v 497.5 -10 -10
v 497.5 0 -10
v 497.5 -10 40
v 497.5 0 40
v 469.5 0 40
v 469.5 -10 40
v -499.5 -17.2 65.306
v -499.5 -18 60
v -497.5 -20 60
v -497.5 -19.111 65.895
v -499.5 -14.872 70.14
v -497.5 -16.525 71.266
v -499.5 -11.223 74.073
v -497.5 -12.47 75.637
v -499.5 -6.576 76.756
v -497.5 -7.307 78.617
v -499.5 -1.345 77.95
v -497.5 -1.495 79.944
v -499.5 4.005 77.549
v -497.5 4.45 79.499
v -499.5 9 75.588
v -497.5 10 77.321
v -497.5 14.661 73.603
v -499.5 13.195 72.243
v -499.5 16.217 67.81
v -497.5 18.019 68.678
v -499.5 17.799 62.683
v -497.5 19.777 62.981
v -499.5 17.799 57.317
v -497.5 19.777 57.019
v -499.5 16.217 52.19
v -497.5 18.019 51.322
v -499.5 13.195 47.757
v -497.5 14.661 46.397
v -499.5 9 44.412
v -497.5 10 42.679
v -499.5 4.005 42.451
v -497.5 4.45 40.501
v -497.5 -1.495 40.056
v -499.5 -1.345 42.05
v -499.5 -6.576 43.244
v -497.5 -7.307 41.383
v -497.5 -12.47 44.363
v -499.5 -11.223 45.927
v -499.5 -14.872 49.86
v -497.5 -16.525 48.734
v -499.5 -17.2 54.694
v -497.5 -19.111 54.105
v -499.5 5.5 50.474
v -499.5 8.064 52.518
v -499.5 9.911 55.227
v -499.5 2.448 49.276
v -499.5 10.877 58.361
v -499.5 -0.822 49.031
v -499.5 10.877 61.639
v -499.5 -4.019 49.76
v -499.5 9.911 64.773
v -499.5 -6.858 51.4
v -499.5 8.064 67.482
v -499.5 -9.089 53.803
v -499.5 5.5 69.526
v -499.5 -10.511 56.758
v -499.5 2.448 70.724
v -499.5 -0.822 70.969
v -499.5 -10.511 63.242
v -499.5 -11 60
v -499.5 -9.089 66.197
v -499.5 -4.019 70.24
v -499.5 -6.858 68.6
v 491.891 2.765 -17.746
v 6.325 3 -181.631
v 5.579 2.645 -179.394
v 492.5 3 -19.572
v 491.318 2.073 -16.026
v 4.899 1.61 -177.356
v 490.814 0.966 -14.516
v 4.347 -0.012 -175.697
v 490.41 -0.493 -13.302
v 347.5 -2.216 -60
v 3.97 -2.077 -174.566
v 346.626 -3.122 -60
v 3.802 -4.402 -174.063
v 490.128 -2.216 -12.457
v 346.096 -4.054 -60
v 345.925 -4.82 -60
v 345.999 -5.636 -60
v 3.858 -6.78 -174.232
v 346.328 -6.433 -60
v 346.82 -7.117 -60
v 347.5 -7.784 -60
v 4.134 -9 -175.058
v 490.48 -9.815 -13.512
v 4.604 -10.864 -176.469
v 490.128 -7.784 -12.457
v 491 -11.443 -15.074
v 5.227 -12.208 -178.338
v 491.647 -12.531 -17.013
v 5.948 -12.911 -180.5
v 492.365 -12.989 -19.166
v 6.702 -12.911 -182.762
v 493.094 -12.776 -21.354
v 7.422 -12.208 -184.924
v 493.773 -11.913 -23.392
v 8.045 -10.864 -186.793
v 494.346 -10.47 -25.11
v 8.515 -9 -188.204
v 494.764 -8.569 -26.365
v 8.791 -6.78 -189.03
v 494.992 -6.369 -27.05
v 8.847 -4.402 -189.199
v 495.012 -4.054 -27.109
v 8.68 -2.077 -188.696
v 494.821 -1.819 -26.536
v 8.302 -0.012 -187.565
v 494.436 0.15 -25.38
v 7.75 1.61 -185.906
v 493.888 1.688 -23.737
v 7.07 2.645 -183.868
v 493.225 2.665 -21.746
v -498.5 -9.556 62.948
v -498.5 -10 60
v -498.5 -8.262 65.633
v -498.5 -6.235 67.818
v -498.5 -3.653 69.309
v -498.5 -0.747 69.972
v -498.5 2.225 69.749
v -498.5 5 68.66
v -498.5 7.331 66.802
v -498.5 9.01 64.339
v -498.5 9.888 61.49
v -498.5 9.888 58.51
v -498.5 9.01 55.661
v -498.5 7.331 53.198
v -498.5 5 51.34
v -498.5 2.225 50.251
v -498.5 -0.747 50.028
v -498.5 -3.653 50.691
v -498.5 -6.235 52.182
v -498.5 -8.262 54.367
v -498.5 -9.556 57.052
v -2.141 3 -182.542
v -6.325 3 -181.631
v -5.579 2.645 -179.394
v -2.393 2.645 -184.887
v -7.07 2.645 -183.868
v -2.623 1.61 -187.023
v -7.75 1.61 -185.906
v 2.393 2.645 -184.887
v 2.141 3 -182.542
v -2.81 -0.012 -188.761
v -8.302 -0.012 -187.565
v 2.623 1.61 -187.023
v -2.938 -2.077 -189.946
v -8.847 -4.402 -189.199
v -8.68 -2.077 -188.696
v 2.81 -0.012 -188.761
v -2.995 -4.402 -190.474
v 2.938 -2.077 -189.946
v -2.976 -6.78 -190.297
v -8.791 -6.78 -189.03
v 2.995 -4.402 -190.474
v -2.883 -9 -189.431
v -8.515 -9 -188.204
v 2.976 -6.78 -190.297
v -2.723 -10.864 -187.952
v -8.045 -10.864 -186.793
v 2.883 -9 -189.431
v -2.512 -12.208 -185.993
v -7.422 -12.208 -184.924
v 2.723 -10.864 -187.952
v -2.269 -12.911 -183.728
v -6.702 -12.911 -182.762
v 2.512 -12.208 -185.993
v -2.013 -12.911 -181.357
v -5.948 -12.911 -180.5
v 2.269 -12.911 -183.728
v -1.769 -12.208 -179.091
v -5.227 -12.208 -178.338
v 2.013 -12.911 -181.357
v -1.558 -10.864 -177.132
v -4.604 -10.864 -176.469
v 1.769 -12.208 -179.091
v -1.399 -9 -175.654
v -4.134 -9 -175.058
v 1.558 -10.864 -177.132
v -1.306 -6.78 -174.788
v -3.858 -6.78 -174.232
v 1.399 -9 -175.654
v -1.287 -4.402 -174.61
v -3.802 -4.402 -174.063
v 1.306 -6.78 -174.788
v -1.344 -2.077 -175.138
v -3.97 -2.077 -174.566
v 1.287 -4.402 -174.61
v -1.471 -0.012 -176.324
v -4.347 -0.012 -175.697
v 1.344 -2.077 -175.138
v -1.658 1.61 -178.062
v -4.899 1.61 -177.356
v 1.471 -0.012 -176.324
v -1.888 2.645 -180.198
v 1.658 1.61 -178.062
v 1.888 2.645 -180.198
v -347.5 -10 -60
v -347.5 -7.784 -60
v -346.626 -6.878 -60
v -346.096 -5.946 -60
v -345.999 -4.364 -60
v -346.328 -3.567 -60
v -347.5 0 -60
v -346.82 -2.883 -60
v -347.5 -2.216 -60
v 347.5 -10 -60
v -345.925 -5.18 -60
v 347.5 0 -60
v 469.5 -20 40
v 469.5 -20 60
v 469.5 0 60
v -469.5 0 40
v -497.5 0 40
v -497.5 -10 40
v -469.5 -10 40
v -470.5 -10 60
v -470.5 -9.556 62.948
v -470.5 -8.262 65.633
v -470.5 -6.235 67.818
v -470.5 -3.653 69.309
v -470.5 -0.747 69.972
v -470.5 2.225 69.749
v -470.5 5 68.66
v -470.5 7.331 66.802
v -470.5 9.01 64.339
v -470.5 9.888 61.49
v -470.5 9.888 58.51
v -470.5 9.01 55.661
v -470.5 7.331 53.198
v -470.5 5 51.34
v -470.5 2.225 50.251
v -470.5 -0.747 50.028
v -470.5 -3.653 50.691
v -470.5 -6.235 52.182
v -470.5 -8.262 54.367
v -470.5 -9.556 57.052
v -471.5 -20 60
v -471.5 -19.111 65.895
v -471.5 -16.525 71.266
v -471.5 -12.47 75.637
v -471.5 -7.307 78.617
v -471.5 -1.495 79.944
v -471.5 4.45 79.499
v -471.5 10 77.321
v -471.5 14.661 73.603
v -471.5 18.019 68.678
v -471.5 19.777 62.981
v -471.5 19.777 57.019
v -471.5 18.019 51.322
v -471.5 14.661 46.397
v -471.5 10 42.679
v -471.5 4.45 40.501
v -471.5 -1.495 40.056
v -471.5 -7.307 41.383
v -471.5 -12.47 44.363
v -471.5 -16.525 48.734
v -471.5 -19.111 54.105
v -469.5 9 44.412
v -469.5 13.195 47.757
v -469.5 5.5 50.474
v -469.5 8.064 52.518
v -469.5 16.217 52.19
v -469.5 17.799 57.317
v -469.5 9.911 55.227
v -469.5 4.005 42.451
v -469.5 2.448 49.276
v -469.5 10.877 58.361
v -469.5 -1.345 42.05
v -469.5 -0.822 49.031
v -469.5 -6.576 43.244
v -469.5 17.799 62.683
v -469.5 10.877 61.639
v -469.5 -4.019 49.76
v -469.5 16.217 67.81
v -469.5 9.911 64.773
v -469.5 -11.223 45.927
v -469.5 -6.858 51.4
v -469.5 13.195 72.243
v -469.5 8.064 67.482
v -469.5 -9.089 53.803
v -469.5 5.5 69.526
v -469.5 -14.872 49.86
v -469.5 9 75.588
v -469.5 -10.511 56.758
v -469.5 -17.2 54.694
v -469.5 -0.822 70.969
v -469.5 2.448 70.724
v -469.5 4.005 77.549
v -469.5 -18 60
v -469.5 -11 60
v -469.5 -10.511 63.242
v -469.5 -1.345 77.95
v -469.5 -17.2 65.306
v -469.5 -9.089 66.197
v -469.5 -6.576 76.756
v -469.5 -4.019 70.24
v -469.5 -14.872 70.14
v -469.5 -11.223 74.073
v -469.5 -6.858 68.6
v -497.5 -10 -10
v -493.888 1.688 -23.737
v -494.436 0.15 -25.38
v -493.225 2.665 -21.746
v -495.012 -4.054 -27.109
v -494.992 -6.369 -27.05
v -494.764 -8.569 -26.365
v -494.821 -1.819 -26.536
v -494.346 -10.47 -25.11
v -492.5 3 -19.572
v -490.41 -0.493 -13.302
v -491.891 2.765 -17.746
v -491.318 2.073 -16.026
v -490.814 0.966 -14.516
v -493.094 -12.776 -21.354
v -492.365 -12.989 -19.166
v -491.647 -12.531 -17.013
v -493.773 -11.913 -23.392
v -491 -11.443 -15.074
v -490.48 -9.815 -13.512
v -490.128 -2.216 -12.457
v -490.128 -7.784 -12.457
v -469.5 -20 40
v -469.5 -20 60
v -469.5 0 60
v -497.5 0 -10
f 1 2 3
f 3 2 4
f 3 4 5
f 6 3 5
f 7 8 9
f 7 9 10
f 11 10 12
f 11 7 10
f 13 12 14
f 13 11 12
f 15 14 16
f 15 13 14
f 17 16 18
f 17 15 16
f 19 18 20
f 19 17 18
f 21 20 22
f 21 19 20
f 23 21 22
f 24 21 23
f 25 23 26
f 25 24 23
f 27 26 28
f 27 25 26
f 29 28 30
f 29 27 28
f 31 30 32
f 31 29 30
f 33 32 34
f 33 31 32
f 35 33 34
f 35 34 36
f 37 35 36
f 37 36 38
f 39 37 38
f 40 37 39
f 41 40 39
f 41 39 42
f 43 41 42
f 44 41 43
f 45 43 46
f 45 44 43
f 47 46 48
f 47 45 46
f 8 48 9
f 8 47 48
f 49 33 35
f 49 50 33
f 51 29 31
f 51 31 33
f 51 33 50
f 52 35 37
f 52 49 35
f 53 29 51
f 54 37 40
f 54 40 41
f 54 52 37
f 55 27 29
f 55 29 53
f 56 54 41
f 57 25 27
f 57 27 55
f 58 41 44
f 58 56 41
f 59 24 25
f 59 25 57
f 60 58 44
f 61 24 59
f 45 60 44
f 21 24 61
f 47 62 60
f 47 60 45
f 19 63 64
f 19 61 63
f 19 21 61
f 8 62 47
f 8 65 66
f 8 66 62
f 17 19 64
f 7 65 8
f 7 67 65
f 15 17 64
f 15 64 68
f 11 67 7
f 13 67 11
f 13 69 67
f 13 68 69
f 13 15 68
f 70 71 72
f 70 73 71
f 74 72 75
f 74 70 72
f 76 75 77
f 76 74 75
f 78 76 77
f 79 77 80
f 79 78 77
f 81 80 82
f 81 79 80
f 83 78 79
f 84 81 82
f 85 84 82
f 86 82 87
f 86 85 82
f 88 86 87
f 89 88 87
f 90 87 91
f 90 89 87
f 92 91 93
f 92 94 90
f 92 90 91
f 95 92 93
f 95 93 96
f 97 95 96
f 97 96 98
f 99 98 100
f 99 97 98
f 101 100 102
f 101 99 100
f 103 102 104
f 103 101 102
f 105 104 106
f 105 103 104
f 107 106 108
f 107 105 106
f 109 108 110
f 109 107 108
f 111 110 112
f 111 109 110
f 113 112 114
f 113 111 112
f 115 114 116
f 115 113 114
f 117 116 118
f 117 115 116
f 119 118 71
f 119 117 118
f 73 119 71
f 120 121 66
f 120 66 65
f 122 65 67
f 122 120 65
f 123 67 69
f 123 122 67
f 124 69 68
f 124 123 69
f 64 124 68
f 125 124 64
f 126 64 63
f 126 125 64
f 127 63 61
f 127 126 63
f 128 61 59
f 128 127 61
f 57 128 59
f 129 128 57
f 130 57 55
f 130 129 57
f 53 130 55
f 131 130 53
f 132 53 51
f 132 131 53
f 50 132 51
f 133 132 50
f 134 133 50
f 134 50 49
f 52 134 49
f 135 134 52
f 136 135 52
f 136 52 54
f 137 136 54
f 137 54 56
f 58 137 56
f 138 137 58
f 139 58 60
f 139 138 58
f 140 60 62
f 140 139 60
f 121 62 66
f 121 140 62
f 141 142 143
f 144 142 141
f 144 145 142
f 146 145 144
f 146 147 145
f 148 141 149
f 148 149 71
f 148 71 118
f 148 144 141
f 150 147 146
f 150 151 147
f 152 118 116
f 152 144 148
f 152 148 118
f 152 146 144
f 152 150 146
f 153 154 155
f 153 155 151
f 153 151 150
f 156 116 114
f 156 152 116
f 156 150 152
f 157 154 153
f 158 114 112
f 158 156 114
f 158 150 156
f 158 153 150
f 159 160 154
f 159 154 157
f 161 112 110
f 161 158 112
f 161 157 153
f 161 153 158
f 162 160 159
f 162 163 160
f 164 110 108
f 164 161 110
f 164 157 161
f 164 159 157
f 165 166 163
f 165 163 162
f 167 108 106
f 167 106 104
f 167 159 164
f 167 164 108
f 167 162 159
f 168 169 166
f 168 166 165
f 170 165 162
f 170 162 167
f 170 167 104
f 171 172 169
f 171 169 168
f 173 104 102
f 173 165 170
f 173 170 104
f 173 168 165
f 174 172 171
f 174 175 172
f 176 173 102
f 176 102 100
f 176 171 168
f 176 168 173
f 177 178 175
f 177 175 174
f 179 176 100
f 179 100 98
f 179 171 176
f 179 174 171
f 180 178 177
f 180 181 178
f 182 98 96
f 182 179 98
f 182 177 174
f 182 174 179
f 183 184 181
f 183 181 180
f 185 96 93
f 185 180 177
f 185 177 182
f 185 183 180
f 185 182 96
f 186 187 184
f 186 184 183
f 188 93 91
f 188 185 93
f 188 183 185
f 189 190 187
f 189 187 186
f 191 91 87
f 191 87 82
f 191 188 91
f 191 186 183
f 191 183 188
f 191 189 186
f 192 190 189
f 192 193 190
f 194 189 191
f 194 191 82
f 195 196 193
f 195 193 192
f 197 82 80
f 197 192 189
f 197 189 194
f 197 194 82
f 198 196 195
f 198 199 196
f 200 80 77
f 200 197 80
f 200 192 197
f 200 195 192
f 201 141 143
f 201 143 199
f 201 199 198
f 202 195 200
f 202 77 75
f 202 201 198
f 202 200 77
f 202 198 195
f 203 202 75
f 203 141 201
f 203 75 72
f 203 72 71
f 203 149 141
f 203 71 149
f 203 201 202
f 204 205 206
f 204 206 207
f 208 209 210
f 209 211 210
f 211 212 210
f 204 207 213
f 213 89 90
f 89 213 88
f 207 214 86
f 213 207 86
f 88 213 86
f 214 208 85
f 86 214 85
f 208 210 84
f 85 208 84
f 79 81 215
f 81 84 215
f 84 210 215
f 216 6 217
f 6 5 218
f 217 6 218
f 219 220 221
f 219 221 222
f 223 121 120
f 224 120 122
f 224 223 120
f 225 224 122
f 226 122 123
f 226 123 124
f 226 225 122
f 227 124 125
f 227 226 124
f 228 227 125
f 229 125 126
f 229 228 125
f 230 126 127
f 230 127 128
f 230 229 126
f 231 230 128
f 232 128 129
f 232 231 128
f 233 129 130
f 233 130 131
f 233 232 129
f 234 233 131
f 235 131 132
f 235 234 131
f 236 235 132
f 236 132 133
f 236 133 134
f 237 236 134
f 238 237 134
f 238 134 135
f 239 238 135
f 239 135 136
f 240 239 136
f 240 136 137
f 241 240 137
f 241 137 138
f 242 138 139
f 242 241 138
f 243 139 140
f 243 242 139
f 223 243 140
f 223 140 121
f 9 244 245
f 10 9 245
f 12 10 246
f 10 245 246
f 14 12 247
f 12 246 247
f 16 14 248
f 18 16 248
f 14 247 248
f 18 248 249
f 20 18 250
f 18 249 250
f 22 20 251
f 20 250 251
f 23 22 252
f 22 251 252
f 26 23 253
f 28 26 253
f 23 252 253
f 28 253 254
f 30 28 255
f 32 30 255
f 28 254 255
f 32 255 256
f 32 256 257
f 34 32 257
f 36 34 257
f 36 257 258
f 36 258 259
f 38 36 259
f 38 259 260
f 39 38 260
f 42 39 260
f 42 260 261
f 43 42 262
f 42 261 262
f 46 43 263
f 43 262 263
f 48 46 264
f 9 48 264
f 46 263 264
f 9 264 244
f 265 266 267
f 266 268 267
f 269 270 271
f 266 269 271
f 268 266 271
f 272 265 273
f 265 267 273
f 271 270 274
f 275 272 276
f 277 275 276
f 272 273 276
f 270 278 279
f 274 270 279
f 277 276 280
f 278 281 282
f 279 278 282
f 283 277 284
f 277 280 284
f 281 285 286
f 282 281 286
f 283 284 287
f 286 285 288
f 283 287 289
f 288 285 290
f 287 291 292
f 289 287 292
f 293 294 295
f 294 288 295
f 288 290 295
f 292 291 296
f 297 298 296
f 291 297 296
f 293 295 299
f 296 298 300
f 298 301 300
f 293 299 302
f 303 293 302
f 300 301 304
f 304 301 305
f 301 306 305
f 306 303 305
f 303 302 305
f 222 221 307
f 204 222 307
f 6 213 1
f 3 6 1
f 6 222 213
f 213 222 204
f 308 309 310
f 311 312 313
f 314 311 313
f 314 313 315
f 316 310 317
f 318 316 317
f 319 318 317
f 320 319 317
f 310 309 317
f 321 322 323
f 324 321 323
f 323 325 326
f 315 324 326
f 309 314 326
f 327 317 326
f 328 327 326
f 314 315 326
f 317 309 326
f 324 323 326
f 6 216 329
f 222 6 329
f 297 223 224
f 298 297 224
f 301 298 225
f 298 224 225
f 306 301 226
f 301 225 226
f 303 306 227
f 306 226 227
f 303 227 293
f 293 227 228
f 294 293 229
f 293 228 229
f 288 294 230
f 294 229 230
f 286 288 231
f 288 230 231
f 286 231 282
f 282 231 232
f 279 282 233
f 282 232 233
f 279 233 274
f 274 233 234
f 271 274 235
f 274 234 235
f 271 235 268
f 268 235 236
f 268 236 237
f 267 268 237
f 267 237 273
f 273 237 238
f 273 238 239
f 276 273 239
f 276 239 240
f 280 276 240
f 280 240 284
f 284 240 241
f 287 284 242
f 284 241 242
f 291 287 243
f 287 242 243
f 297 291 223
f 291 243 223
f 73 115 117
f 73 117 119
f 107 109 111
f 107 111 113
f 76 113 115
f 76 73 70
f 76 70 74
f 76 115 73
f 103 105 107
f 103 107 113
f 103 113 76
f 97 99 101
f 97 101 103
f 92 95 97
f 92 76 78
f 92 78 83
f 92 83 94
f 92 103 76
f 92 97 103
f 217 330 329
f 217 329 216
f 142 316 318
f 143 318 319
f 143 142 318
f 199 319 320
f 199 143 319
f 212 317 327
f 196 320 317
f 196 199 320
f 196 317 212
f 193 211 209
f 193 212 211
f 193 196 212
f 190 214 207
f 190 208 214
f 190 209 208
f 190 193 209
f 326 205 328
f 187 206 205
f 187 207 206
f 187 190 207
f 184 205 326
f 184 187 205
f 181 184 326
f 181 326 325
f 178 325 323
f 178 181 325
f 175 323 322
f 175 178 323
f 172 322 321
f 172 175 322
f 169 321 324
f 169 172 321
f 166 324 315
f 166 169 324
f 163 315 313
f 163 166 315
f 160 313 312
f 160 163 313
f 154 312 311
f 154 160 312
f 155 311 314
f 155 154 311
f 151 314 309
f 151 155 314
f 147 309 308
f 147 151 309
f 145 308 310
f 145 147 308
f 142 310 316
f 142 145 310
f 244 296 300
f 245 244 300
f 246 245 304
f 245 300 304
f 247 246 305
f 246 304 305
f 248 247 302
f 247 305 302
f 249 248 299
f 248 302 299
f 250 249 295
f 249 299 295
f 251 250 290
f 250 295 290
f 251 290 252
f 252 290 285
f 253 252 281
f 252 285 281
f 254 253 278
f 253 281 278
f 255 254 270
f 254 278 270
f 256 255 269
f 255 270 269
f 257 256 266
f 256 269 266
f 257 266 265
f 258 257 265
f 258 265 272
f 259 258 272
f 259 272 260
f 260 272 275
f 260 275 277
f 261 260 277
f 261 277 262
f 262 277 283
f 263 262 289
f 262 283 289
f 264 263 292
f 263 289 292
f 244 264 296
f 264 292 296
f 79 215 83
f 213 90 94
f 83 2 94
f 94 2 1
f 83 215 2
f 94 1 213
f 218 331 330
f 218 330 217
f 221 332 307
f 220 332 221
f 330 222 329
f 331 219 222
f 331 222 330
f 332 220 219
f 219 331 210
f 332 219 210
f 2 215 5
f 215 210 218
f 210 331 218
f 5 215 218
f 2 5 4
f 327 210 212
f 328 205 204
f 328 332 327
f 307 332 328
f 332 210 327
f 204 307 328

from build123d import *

# Parameters (mm, degrees)
F0_W      = 995
F0_H      = 120
F1_DEPTH  = 20
F2_W      = 28
F2_H      = 20
F3_DEPTH  = 25
F4_R      = 20
F4_R_2    = 10
F5_DEPTH  = 30
F6_SIZE   = 2
F7_SIZE   = 1
F9_DEPTH  = 10
F10_SIZE2 = 50
F10_SIZE  = 150
F14_R     = 8


# Not quite as in the source:
# - a pattern or mirror of a feature is missing from the dataset's text; its kind, count and spacing are read off the source's solid


with BuildPart() as f1:
    # F0 (on Front) → F1 (new body)
    with BuildSketch(Plane.XZ):
        Rectangle(F0_W, F0_H)
    extrude(amount=F1_DEPTH)

    # F2 (on Front) → F3 (cut)
    with BuildSketch(Plane.XZ):
        with Locations((-483.5, 50)):
            Rectangle(F2_W, F2_H)
    f3 = extrude(amount=F3_DEPTH, mode=Mode.SUBTRACT)

    # F3_copies: F3 across plane
    add(f3.mirror(Plane(origin=(0, 0, 0), x_dir=(0, 0, 1), z_dir=(1, 0, 0))), mode=Mode.SUBTRACT)

    # F8 (on face) → F9 (cut)
    with BuildSketch(Plane.XZ.offset(20)):
        Polygon((-497.5, 40), (-497.5, -60), (497.5, -60), (497.5, 40), (469.5, 40), (-469.5, 40), align=None)
    extrude(amount=-F9_DEPTH, mode=Mode.SUBTRACT)

    # F10
    f10_edges = [f1.edges().sort_by_distance(p)[0] for p in [
        (-497.5, -5, -60),
        (497.5, -5, -60),
    ]]
    f10_side = f1.faces().sort_by_distance((0, -5, -60))[0]
    chamfer(f10_edges, length=F10_SIZE, length2=F10_SIZE2, reference=f10_side)

    # F15: sweep along a path in F12
    with BuildLine(Plane.XZ.offset(5)) as f15_path:
        Line((-492.5, -19.5723608171), (-6.3245553203, -181.630842377))
        ThreePointArc((-6.3245553203, -181.630842377), (0, -182.657176416), (6.3245553203, -181.630842377))
        Line((6.3245553203, -181.630842377), (492.5, -19.5723608171))
    # F14 (on line) → F15 (sweep)
    with BuildSketch(Plane(origin=(-437.3782917549, 0, 145.7927639183), x_dir=(0, 1, 0), z_dir=(0.9486832981, 0, -0.316227766))):
        with Locations((-5, -174.3101465739)):
            Circle(F14_R)
    sweep(path=f15_path.line)


with BuildPart() as f5:
    # F4 (on face) → F5 (new body)
    with BuildSketch(Plane(origin=(-469.5, 0, 0), x_dir=(0, -1, 0), z_dir=(-1, 0, 0))):
        with Locations((0, 60)):
            Circle(F4_R)
        with Locations((0, 60)):
            Circle(F4_R_2, mode=Mode.SUBTRACT)
    extrude(amount=F5_DEPTH)

    # F6
    f6_edges = [f5.edges().sort_by_distance(p)[0] for p in [
        (-469.5, 20, 60),
        (-499.5, 20, 60),
    ]]
    chamfer(f6_edges, length=F6_SIZE)

    # F7
    f7_edges = [f5.edges().sort_by_distance(p)[0] for p in [
        (-469.5, 10, 60),
        (-499.5, 10, 60),
    ]]
    chamfer(f7_edges, length=F7_SIZE)


solid = Compound([f1.part, f5.part])
